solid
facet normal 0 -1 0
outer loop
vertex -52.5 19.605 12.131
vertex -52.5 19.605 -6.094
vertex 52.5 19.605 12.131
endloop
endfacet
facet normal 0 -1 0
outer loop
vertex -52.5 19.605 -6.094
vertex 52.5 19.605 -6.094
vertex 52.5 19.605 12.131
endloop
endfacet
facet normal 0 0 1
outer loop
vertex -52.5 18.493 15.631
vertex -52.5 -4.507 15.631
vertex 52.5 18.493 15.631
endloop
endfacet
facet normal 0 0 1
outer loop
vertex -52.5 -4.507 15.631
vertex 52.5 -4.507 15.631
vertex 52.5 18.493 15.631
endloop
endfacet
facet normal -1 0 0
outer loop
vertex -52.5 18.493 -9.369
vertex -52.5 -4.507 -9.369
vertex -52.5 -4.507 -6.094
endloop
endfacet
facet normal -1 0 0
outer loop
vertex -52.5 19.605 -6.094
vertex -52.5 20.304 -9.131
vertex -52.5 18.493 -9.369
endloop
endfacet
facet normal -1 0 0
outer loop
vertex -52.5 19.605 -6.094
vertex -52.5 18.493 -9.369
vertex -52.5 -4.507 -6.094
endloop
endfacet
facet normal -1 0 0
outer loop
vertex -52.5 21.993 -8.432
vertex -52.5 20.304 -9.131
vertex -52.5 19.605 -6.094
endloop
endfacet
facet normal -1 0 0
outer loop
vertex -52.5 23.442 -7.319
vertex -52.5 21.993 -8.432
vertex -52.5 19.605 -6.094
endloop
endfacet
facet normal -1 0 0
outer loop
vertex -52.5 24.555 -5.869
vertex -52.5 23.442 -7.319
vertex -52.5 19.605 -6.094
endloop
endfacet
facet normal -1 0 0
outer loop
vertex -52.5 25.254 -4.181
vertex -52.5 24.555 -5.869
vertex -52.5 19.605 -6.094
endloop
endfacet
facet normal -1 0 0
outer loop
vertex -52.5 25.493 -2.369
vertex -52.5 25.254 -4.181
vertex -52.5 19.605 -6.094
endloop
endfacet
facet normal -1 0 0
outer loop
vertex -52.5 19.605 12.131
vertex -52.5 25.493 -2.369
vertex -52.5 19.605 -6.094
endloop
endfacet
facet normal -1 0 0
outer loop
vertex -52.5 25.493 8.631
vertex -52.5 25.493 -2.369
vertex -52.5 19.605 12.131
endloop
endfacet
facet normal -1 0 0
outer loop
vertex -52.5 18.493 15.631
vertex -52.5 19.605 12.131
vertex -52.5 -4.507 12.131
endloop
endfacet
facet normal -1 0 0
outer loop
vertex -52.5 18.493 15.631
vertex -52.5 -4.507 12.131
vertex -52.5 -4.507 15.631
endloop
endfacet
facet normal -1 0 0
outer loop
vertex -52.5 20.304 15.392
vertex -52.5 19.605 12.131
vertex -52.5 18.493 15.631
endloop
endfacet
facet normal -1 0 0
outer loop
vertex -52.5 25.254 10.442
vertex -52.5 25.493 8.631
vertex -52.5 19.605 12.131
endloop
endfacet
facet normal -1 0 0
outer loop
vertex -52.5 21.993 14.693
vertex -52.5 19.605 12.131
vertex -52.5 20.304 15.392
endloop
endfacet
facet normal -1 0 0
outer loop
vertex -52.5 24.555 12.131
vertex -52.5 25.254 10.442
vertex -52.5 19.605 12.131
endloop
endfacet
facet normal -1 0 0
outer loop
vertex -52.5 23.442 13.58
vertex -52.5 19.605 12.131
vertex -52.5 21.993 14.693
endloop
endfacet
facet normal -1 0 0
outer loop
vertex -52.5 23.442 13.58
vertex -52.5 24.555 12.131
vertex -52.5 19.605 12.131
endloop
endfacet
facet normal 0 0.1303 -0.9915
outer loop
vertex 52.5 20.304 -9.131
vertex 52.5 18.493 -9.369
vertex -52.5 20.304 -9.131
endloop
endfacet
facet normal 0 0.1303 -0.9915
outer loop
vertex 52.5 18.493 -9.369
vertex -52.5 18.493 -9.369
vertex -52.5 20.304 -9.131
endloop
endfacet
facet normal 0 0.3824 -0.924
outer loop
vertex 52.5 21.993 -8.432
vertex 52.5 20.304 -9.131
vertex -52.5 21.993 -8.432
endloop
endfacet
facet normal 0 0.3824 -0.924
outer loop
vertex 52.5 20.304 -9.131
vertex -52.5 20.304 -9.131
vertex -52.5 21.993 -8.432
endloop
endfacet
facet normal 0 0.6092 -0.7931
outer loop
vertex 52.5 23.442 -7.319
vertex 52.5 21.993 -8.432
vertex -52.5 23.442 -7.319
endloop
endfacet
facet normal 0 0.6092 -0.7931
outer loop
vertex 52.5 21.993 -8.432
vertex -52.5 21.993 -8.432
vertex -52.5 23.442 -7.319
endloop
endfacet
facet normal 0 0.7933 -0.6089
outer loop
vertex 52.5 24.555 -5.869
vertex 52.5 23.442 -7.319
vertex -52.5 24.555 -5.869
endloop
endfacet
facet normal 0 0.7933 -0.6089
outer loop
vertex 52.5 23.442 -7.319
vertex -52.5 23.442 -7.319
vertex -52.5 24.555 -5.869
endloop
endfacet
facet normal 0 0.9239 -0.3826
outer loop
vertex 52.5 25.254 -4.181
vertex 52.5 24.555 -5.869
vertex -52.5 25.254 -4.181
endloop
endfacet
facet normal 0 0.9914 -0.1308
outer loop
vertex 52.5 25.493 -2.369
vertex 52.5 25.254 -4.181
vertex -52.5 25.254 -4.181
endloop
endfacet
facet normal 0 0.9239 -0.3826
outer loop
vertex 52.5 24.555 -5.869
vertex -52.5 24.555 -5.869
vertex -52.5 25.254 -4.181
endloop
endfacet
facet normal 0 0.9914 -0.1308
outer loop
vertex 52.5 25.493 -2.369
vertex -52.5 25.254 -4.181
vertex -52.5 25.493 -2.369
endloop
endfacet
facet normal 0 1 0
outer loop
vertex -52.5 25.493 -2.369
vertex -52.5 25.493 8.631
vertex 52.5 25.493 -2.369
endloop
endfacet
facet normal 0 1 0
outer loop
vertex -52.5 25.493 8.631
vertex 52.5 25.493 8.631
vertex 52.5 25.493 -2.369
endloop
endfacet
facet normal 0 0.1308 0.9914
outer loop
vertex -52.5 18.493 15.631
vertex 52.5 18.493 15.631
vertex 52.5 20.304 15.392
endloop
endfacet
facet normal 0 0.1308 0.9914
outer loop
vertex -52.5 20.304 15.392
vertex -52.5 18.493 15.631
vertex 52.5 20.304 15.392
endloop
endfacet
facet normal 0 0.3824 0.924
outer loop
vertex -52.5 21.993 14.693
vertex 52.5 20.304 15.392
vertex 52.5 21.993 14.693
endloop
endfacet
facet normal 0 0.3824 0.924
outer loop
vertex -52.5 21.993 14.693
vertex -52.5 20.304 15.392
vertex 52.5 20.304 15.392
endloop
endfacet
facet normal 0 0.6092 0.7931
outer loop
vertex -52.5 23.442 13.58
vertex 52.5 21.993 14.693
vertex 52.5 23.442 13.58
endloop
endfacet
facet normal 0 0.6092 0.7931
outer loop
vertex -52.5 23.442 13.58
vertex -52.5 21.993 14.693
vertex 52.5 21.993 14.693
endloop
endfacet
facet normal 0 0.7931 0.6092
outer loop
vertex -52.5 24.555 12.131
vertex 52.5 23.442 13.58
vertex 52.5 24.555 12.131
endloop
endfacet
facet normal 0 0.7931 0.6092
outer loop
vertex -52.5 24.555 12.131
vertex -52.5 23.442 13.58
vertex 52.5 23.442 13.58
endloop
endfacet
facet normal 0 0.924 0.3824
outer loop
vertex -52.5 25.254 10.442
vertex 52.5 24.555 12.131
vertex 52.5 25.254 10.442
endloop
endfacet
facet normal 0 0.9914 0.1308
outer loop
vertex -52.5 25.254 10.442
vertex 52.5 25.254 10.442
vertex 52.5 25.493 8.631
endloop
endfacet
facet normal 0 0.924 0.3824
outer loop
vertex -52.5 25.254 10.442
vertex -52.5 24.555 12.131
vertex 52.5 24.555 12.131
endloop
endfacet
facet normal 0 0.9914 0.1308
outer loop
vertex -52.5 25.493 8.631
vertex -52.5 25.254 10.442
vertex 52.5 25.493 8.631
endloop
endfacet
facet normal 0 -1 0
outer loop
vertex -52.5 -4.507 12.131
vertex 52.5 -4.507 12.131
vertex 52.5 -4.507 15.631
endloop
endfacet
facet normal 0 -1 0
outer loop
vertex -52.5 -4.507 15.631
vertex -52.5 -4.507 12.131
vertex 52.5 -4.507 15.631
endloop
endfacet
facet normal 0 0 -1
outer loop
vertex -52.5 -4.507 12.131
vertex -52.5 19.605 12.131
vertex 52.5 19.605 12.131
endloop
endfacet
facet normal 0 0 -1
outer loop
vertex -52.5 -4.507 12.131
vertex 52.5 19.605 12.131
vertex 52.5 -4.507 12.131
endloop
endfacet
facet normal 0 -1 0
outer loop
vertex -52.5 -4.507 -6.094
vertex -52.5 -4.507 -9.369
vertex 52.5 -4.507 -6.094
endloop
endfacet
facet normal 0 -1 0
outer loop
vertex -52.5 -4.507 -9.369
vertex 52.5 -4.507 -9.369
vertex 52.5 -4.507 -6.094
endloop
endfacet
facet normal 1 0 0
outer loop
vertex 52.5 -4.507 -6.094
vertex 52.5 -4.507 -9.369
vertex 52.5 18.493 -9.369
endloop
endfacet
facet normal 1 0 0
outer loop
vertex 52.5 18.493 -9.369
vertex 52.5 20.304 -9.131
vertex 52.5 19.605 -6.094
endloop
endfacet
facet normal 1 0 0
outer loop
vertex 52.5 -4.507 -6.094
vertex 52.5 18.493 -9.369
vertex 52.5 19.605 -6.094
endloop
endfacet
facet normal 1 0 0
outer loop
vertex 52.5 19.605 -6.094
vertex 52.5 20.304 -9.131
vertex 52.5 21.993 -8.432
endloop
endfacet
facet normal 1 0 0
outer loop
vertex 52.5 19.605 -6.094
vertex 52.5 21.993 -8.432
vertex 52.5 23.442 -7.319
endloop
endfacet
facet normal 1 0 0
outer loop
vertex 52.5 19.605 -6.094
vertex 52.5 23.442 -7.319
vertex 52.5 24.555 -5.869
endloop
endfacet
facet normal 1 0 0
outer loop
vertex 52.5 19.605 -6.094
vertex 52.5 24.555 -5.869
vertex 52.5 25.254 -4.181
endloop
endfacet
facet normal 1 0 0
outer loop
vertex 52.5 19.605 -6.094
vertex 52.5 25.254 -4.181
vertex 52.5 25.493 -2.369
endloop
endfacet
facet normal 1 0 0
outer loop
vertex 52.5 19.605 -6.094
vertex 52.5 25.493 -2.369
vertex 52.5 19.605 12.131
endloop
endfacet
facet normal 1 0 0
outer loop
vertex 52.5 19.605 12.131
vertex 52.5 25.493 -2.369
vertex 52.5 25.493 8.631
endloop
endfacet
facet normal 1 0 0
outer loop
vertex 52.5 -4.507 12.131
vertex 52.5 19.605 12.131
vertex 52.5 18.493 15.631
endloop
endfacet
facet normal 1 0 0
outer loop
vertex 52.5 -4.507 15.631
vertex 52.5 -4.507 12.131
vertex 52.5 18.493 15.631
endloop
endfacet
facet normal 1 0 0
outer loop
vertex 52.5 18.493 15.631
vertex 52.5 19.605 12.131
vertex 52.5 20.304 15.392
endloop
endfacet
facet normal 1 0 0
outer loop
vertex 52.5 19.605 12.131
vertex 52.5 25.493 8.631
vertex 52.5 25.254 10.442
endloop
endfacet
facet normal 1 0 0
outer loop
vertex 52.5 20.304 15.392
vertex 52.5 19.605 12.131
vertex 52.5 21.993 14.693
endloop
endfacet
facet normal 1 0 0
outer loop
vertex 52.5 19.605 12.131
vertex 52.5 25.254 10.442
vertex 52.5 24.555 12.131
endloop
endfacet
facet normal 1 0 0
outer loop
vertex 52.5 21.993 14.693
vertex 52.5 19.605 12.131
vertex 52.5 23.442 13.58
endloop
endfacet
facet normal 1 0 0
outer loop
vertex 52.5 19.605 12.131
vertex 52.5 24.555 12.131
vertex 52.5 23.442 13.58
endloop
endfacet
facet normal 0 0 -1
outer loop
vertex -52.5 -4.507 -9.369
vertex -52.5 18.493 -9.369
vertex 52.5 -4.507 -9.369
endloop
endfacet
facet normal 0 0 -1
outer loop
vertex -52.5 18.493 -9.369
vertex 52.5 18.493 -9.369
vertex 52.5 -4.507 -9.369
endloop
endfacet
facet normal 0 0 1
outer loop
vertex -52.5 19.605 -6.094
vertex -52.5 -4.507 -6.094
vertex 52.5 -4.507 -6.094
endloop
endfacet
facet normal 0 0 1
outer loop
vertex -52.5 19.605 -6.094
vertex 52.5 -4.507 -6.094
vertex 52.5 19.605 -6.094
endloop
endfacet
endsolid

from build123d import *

# Parameters (mm, degrees)
BOSS_EXTRUDE1_DEPTH = 52.5
FILLET1_R           = 7


with BuildPart() as part:
    # Sketch1 → Boss-Extrude1 (new, symmetric)
    with BuildSketch(Plane(origin=(0, 0, 0), x_dir=(0, 0, -1), z_dir=(1, 0, 0))):
        Polygon((-15.630670187, -4.507264222), (-15.630670187, 25.492735778), (9.369329813, 25.492735778), (9.369329813, -4.507264222), (6.093628879, -4.507264222), (6.093628879, 19.604885311), (-12.130670187, 19.604885311), (-12.130670187, -4.507264222), align=None)
    extrude(amount=BOSS_EXTRUDE1_DEPTH, both=True)

    # Fillet1
    fillet1_edges = [part.edges().sort_by_distance(p)[0] for p in [
        (0, 25.492735778, 15.630670187),
        (0, 25.492735778, -9.369329813),
    ]]
    fillet(fillet1_edges, radius=FILLET1_R)


solid = part.part
